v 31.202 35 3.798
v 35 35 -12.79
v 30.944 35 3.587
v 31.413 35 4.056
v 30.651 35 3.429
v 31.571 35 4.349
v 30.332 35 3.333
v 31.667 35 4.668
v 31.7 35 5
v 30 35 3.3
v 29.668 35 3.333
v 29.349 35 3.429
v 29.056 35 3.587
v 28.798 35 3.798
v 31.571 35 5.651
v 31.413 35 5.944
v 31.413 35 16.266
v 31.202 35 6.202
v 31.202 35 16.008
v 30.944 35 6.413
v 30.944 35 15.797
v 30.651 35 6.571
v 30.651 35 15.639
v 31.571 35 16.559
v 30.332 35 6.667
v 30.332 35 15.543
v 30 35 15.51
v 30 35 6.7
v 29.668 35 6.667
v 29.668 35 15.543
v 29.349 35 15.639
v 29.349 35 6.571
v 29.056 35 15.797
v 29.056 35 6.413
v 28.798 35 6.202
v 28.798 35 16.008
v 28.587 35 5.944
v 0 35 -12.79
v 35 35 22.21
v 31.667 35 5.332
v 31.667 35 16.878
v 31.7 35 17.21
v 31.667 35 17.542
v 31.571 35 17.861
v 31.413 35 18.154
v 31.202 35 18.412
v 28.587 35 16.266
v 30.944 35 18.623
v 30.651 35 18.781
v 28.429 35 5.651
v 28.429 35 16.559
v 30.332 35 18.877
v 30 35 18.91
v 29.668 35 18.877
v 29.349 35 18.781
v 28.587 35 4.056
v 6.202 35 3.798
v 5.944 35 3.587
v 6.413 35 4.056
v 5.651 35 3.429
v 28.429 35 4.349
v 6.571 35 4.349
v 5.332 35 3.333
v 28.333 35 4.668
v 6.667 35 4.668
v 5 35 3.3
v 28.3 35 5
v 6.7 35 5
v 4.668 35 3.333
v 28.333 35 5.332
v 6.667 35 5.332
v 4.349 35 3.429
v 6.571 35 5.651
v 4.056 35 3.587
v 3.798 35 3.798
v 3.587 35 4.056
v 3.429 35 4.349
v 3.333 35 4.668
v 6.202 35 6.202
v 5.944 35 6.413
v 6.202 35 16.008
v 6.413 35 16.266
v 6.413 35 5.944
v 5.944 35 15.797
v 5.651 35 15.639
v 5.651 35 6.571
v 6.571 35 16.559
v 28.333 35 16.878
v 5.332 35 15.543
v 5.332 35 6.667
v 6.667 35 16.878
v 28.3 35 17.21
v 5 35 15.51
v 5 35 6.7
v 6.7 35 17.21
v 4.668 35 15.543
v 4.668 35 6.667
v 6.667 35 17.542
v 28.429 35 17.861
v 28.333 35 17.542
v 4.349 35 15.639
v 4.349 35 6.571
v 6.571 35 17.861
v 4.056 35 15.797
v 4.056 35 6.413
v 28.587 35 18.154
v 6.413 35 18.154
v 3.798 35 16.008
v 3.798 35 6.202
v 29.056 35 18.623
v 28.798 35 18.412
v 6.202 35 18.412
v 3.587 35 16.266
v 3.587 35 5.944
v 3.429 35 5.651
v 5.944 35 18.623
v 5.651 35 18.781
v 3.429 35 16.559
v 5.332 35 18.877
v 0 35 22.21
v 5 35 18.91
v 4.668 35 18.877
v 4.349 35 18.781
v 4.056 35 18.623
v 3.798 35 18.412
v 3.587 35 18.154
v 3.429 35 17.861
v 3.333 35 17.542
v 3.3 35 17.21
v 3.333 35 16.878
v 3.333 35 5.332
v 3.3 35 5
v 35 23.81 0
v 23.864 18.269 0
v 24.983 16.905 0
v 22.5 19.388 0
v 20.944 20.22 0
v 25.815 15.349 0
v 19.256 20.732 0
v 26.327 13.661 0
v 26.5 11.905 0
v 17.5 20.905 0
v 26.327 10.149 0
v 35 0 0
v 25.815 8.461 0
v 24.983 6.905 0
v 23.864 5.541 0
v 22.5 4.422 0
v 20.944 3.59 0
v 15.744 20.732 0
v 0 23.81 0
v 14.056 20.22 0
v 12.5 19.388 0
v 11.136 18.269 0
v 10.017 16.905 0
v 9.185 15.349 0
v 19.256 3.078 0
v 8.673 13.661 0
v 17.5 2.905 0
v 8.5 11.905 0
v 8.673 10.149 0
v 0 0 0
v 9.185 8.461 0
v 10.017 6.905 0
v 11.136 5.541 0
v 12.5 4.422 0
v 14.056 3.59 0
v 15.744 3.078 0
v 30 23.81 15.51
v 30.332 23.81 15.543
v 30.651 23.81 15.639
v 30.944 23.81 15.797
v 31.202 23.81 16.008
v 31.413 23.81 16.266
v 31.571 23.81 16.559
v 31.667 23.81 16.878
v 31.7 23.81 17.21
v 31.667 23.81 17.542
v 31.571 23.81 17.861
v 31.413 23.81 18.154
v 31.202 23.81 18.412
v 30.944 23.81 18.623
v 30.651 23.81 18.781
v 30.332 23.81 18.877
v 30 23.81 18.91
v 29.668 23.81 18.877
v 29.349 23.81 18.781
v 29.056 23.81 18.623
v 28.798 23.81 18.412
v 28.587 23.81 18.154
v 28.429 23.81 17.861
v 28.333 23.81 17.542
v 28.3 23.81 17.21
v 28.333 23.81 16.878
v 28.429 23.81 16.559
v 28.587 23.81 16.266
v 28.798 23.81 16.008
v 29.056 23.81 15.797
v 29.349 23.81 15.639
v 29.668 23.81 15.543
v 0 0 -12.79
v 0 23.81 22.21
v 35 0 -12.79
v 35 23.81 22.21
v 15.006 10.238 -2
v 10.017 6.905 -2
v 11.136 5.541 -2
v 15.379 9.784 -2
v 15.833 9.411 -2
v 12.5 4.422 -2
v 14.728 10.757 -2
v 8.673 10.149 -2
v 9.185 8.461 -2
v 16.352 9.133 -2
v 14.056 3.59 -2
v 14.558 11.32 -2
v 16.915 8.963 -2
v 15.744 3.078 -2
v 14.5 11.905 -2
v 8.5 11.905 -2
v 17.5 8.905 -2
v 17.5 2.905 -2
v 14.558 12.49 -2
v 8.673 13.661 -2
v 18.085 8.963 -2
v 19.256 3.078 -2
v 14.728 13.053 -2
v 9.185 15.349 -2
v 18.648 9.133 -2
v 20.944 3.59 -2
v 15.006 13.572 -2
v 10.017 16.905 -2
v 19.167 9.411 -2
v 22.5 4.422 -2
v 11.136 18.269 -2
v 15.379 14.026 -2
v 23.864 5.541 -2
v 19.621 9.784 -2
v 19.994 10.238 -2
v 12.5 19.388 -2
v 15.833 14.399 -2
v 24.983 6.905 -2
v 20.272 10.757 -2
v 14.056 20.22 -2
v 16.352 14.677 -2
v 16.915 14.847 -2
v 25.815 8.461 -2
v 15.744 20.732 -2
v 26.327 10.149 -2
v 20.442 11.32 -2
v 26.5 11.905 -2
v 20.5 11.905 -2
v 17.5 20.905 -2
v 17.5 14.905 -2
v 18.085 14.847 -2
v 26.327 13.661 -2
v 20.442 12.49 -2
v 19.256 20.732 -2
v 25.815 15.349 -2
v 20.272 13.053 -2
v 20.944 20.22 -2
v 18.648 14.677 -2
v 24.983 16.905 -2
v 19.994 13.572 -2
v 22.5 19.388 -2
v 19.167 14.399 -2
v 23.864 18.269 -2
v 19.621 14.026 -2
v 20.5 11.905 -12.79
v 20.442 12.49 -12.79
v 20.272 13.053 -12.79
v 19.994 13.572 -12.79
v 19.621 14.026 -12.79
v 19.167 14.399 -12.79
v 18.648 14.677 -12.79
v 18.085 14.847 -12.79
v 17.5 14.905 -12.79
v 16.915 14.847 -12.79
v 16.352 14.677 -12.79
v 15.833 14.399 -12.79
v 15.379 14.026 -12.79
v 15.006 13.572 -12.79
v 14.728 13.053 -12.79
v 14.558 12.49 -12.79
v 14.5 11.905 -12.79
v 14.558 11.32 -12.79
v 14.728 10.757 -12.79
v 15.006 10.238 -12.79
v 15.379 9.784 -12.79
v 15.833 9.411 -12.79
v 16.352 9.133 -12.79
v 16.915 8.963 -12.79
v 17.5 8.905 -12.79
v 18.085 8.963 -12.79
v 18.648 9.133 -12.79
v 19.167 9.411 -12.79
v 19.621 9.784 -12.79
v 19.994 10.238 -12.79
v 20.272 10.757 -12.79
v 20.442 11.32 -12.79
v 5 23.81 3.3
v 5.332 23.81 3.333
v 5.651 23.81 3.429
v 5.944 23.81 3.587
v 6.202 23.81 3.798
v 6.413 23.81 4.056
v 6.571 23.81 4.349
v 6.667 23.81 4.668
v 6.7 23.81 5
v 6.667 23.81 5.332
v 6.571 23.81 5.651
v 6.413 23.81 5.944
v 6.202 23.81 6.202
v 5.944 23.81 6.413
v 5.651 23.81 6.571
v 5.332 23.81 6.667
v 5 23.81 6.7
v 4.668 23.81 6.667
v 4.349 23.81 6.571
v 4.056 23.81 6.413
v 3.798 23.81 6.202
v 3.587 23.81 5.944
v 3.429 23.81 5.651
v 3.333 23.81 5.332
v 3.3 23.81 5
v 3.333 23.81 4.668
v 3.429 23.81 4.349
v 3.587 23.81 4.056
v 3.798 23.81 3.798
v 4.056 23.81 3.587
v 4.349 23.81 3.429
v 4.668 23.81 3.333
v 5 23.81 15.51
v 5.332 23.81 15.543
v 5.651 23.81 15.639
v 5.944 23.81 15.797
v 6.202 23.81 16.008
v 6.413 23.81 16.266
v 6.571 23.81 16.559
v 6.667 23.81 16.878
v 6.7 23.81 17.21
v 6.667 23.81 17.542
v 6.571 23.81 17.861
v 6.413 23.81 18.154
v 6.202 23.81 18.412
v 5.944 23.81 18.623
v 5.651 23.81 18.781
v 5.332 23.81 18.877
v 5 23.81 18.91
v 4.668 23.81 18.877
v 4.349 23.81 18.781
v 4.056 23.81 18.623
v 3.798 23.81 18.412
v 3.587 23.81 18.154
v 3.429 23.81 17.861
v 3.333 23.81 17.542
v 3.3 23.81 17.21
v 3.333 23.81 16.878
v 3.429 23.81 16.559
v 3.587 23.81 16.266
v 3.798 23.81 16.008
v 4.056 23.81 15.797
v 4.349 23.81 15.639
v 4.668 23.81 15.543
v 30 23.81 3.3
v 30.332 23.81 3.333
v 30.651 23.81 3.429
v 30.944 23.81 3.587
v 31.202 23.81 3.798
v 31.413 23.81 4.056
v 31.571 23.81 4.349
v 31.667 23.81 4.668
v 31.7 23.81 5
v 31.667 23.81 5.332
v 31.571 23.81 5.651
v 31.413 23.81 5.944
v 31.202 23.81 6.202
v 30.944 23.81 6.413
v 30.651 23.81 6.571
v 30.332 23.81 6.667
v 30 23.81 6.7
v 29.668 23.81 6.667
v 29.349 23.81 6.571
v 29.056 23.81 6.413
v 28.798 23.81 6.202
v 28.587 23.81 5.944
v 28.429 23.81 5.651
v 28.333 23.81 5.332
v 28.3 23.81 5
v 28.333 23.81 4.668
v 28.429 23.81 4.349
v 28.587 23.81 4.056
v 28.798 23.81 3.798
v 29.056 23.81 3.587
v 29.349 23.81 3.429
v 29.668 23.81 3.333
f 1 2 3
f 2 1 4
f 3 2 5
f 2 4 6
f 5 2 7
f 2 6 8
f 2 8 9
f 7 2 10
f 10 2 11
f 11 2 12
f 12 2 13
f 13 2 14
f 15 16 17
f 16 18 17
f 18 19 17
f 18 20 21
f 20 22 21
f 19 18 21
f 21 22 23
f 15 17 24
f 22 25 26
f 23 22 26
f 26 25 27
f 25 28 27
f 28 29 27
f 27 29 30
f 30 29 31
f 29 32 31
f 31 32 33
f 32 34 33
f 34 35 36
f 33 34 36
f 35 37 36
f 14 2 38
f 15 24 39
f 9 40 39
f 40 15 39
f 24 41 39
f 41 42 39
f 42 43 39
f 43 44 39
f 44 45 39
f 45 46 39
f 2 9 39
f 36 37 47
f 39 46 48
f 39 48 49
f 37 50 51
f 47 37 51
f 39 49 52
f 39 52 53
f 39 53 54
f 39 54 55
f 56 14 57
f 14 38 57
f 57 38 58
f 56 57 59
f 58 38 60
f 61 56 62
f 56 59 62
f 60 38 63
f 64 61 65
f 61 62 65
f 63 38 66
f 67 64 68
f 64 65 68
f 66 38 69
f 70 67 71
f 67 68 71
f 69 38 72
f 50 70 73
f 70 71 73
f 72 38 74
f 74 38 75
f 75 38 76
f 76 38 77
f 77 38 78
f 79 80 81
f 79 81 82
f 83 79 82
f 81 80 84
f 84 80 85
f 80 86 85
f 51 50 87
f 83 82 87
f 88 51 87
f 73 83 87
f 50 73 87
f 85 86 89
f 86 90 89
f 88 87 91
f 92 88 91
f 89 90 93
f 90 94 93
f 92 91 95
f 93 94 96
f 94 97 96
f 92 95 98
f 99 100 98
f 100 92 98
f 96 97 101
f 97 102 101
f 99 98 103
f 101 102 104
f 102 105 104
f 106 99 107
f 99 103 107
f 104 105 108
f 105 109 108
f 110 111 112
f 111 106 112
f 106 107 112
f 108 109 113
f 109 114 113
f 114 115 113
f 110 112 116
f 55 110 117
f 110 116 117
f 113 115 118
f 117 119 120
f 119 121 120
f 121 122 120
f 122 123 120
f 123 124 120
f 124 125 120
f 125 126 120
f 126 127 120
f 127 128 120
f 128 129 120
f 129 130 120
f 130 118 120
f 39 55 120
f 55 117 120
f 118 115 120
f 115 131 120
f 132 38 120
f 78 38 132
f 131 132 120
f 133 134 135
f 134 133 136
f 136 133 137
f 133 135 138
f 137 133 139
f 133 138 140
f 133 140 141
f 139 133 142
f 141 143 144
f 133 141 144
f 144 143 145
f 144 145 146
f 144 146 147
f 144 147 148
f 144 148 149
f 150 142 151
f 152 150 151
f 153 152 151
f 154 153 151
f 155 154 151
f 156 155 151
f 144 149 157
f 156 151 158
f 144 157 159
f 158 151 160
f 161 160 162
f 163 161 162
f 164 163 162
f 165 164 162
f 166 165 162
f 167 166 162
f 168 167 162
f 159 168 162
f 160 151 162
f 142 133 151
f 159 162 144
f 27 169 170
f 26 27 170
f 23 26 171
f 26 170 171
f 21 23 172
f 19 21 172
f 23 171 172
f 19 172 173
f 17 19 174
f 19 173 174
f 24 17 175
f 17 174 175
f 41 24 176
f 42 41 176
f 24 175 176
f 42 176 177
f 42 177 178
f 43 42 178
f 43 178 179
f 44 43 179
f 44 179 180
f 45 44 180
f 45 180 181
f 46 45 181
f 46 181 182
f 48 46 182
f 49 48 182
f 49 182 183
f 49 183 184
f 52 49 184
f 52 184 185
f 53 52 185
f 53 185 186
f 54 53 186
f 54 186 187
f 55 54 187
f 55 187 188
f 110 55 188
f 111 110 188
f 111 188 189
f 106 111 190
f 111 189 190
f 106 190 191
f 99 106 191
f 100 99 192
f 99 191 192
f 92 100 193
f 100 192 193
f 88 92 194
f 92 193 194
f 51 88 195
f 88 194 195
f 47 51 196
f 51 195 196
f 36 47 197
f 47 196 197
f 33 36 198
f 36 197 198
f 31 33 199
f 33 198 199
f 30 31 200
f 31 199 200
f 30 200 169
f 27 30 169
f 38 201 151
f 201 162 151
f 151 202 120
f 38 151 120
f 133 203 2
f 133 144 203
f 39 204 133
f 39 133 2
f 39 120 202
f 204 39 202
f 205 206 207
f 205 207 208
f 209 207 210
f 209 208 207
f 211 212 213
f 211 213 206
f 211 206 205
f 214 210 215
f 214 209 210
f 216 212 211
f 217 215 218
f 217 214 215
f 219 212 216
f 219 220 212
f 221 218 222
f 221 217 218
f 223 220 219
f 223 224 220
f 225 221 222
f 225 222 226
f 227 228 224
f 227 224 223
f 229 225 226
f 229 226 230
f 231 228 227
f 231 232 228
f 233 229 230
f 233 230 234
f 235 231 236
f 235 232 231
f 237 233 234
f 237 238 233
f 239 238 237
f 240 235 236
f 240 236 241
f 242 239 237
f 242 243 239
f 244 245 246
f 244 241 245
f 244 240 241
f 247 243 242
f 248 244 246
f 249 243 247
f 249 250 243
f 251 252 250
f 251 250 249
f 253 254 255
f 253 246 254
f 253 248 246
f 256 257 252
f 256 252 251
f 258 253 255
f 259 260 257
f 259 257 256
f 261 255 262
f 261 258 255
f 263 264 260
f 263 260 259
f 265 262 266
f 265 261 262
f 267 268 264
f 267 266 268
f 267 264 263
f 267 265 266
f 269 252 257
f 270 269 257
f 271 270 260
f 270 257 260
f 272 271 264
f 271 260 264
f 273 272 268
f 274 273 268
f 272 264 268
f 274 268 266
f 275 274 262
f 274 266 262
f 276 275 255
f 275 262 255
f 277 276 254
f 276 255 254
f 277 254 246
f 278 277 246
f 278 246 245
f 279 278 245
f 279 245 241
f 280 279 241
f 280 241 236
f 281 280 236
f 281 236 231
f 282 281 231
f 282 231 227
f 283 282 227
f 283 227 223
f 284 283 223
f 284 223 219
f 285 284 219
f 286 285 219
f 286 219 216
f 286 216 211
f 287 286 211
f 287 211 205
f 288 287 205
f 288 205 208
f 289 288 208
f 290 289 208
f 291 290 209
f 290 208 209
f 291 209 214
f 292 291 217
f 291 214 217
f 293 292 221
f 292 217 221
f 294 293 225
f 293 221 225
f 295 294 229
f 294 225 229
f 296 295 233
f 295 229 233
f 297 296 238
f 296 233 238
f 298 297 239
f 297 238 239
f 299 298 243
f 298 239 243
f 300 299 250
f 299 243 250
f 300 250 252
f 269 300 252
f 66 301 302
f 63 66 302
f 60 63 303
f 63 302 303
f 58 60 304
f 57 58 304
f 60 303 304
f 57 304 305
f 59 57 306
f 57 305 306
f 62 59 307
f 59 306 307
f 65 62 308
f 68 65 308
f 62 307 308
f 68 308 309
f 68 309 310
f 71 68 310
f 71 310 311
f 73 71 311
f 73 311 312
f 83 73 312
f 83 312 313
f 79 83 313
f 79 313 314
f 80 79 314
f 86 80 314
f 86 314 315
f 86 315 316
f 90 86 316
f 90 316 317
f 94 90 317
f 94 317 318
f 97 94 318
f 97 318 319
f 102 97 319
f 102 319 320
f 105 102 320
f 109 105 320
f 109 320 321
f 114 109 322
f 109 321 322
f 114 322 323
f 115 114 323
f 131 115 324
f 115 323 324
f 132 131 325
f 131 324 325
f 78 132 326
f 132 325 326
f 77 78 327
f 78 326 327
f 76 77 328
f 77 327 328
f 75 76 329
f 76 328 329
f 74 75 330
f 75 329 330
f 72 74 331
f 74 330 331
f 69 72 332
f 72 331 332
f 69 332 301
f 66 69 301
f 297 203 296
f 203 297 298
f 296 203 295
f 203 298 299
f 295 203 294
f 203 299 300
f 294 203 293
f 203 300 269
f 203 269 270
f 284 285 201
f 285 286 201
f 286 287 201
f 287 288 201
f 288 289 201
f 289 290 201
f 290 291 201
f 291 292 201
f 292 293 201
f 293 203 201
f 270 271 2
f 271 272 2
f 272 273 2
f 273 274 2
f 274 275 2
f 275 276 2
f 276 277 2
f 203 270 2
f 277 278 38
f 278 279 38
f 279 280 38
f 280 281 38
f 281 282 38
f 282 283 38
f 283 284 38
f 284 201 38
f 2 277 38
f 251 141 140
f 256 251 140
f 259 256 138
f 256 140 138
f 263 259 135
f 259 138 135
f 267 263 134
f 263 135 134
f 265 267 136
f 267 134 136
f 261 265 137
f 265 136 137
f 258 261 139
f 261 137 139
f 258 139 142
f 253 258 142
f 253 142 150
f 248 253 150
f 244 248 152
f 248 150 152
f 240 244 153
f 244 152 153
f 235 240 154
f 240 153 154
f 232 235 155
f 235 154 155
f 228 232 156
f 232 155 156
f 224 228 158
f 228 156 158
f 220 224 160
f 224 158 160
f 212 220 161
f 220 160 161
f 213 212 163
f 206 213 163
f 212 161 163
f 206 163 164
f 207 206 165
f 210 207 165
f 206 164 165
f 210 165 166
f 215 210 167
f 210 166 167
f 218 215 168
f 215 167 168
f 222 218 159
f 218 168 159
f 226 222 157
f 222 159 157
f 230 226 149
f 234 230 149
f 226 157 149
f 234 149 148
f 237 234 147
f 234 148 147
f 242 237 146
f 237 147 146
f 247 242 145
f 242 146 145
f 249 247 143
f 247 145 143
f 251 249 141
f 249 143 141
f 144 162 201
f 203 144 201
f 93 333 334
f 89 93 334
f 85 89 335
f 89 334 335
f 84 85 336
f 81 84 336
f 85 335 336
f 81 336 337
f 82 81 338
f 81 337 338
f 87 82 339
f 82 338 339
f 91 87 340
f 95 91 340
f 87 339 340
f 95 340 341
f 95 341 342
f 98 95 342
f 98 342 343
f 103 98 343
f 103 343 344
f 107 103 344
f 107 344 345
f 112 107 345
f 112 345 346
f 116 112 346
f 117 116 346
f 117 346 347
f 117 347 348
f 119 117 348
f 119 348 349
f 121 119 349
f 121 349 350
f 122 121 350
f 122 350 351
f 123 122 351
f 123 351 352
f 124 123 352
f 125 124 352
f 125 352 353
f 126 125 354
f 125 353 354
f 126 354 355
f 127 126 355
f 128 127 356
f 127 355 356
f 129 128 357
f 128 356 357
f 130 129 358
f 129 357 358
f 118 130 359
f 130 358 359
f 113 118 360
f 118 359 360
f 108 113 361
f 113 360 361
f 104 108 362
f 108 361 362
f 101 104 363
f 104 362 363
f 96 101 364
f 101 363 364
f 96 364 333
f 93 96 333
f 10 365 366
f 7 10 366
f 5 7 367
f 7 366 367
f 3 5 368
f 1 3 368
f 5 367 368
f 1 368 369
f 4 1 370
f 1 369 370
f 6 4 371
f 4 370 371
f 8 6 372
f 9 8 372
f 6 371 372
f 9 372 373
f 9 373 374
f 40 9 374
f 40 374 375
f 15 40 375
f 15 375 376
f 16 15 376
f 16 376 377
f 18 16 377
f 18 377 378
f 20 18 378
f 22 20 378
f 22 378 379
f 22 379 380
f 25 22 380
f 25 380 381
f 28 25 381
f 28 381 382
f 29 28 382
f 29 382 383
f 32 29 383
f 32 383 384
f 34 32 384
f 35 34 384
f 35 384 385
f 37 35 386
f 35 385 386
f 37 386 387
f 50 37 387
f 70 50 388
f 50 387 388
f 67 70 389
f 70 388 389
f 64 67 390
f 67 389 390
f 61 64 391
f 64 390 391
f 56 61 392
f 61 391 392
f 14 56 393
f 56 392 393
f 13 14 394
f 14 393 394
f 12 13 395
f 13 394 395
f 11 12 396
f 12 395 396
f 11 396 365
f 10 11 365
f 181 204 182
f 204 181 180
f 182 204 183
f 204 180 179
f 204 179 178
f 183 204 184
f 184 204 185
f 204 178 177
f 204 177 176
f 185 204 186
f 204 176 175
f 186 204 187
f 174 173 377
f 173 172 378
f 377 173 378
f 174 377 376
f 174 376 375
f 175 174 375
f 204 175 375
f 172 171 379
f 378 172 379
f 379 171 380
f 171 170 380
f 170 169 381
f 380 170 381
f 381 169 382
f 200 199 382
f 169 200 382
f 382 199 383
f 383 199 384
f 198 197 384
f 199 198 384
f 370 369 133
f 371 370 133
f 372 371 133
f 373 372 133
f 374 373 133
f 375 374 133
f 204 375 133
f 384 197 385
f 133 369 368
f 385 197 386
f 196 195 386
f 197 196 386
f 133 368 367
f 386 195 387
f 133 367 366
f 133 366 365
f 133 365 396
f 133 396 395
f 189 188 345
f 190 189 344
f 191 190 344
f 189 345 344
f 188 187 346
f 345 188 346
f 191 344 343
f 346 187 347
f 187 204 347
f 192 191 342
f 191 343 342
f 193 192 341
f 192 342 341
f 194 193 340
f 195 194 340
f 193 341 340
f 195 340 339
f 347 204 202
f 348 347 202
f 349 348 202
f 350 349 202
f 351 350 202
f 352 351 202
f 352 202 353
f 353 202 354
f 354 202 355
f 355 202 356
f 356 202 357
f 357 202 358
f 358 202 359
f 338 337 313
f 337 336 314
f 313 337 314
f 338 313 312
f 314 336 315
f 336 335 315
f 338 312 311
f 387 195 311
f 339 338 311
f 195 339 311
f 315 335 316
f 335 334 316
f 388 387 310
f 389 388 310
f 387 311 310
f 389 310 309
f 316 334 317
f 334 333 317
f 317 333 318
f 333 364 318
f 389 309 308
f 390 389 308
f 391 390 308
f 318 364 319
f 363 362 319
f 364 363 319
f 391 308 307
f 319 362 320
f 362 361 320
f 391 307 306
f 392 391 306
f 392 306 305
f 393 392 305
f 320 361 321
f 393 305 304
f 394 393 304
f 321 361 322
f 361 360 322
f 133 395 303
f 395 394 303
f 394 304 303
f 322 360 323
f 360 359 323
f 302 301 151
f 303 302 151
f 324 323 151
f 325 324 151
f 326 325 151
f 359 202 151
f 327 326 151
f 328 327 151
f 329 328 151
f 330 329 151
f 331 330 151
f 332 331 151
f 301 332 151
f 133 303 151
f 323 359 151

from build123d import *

# Parameters (mm, degrees)
BOSS_EXTRUDE1_DEPTH = 35
CUT_EXTRUDE1_REACH  = 56.252
SKETCH2_R           = 3
SKETCH2_4_R         = 9
CUT_EXTRUDE2_DEPTH  = 2
CUT_EXTRUDE3_REACH  = 49.804
SKETCH5_R           = 1.7


with BuildPart() as part:
    # Sketch1 → Boss-Extrude1 (new body)
    with BuildSketch(Plane.YZ):
        Polygon((0, -12.79), (35, -12.79), (35, 22.21), (23.81, 22.21), (23.81, 0), (0, 0), align=None)
    extrude(amount=BOSS_EXTRUDE1_DEPTH)

    # Sketch2 → Cut-Extrude1 (cut, up to next)
    with BuildSketch(Plane.XY, mode=Mode.PRIVATE) as cut_extrude1_sk1:
        with Locations((17.5, 11.905)):
            Circle(SKETCH2_R)
    cut_extrude1_tool1 = extrude(cut_extrude1_sk1.sketch, amount=-CUT_EXTRUDE1_REACH, mode=Mode.PRIVATE) & part.part
    add(cut_extrude1_tool1.solids().sort_by_distance((17.5, 11.905, 0))[0], mode=Mode.SUBTRACT)

    # Sketch2<4> → Cut-Extrude2 (cut)
    with BuildSketch(Plane.XY):
        with Locations((17.5, 11.905)):
            Circle(SKETCH2_4_R)
    extrude(amount=-CUT_EXTRUDE2_DEPTH, mode=Mode.SUBTRACT)

    # Sketch5 → Cut-Extrude3 (cut, up to next)
    with BuildSketch(Plane.XZ.offset(-23.81), mode=Mode.PRIVATE) as cut_extrude3_sk1:
        with Locations((5, 17.21)):
            Circle(SKETCH5_R)
    cut_extrude3_tool1 = extrude(cut_extrude3_sk1.sketch, amount=-CUT_EXTRUDE3_REACH, mode=Mode.PRIVATE) & part.part
    # Sketch5 → Cut-Extrude3 (cut, up to next)
    with BuildSketch(Plane.XZ.offset(-23.81), mode=Mode.PRIVATE) as cut_extrude3_sk2:
        with Locations((30, 17.21)):
            Circle(SKETCH5_R)
    cut_extrude3_tool2 = extrude(cut_extrude3_sk2.sketch, amount=-CUT_EXTRUDE3_REACH, mode=Mode.PRIVATE) & part.part
    # Sketch5 → Cut-Extrude3 (cut, up to next)
    with BuildSketch(Plane.XZ.offset(-23.81), mode=Mode.PRIVATE) as cut_extrude3_sk3:
        with Locations((30, 5)):
            Circle(SKETCH5_R)
    cut_extrude3_tool3 = extrude(cut_extrude3_sk3.sketch, amount=-CUT_EXTRUDE3_REACH, mode=Mode.PRIVATE) & part.part
    # Sketch5 → Cut-Extrude3 (cut, up to next)
    with BuildSketch(Plane.XZ.offset(-23.81), mode=Mode.PRIVATE) as cut_extrude3_sk4:
        with Locations((5, 5)):
            Circle(SKETCH5_R)
    cut_extrude3_tool4 = extrude(cut_extrude3_sk4.sketch, amount=-CUT_EXTRUDE3_REACH, mode=Mode.PRIVATE) & part.part
    add(cut_extrude3_tool1.solids().sort_by_distance((5, 23.81, 17.21))[0], mode=Mode.SUBTRACT)
    add(cut_extrude3_tool2.solids().sort_by_distance((30, 23.81, 17.21))[0], mode=Mode.SUBTRACT)
    add(cut_extrude3_tool3.solids().sort_by_distance((30, 23.81, 5))[0], mode=Mode.SUBTRACT)
    add(cut_extrude3_tool4.solids().sort_by_distance((5, 23.81, 5))[0], mode=Mode.SUBTRACT)


solid = part.part
